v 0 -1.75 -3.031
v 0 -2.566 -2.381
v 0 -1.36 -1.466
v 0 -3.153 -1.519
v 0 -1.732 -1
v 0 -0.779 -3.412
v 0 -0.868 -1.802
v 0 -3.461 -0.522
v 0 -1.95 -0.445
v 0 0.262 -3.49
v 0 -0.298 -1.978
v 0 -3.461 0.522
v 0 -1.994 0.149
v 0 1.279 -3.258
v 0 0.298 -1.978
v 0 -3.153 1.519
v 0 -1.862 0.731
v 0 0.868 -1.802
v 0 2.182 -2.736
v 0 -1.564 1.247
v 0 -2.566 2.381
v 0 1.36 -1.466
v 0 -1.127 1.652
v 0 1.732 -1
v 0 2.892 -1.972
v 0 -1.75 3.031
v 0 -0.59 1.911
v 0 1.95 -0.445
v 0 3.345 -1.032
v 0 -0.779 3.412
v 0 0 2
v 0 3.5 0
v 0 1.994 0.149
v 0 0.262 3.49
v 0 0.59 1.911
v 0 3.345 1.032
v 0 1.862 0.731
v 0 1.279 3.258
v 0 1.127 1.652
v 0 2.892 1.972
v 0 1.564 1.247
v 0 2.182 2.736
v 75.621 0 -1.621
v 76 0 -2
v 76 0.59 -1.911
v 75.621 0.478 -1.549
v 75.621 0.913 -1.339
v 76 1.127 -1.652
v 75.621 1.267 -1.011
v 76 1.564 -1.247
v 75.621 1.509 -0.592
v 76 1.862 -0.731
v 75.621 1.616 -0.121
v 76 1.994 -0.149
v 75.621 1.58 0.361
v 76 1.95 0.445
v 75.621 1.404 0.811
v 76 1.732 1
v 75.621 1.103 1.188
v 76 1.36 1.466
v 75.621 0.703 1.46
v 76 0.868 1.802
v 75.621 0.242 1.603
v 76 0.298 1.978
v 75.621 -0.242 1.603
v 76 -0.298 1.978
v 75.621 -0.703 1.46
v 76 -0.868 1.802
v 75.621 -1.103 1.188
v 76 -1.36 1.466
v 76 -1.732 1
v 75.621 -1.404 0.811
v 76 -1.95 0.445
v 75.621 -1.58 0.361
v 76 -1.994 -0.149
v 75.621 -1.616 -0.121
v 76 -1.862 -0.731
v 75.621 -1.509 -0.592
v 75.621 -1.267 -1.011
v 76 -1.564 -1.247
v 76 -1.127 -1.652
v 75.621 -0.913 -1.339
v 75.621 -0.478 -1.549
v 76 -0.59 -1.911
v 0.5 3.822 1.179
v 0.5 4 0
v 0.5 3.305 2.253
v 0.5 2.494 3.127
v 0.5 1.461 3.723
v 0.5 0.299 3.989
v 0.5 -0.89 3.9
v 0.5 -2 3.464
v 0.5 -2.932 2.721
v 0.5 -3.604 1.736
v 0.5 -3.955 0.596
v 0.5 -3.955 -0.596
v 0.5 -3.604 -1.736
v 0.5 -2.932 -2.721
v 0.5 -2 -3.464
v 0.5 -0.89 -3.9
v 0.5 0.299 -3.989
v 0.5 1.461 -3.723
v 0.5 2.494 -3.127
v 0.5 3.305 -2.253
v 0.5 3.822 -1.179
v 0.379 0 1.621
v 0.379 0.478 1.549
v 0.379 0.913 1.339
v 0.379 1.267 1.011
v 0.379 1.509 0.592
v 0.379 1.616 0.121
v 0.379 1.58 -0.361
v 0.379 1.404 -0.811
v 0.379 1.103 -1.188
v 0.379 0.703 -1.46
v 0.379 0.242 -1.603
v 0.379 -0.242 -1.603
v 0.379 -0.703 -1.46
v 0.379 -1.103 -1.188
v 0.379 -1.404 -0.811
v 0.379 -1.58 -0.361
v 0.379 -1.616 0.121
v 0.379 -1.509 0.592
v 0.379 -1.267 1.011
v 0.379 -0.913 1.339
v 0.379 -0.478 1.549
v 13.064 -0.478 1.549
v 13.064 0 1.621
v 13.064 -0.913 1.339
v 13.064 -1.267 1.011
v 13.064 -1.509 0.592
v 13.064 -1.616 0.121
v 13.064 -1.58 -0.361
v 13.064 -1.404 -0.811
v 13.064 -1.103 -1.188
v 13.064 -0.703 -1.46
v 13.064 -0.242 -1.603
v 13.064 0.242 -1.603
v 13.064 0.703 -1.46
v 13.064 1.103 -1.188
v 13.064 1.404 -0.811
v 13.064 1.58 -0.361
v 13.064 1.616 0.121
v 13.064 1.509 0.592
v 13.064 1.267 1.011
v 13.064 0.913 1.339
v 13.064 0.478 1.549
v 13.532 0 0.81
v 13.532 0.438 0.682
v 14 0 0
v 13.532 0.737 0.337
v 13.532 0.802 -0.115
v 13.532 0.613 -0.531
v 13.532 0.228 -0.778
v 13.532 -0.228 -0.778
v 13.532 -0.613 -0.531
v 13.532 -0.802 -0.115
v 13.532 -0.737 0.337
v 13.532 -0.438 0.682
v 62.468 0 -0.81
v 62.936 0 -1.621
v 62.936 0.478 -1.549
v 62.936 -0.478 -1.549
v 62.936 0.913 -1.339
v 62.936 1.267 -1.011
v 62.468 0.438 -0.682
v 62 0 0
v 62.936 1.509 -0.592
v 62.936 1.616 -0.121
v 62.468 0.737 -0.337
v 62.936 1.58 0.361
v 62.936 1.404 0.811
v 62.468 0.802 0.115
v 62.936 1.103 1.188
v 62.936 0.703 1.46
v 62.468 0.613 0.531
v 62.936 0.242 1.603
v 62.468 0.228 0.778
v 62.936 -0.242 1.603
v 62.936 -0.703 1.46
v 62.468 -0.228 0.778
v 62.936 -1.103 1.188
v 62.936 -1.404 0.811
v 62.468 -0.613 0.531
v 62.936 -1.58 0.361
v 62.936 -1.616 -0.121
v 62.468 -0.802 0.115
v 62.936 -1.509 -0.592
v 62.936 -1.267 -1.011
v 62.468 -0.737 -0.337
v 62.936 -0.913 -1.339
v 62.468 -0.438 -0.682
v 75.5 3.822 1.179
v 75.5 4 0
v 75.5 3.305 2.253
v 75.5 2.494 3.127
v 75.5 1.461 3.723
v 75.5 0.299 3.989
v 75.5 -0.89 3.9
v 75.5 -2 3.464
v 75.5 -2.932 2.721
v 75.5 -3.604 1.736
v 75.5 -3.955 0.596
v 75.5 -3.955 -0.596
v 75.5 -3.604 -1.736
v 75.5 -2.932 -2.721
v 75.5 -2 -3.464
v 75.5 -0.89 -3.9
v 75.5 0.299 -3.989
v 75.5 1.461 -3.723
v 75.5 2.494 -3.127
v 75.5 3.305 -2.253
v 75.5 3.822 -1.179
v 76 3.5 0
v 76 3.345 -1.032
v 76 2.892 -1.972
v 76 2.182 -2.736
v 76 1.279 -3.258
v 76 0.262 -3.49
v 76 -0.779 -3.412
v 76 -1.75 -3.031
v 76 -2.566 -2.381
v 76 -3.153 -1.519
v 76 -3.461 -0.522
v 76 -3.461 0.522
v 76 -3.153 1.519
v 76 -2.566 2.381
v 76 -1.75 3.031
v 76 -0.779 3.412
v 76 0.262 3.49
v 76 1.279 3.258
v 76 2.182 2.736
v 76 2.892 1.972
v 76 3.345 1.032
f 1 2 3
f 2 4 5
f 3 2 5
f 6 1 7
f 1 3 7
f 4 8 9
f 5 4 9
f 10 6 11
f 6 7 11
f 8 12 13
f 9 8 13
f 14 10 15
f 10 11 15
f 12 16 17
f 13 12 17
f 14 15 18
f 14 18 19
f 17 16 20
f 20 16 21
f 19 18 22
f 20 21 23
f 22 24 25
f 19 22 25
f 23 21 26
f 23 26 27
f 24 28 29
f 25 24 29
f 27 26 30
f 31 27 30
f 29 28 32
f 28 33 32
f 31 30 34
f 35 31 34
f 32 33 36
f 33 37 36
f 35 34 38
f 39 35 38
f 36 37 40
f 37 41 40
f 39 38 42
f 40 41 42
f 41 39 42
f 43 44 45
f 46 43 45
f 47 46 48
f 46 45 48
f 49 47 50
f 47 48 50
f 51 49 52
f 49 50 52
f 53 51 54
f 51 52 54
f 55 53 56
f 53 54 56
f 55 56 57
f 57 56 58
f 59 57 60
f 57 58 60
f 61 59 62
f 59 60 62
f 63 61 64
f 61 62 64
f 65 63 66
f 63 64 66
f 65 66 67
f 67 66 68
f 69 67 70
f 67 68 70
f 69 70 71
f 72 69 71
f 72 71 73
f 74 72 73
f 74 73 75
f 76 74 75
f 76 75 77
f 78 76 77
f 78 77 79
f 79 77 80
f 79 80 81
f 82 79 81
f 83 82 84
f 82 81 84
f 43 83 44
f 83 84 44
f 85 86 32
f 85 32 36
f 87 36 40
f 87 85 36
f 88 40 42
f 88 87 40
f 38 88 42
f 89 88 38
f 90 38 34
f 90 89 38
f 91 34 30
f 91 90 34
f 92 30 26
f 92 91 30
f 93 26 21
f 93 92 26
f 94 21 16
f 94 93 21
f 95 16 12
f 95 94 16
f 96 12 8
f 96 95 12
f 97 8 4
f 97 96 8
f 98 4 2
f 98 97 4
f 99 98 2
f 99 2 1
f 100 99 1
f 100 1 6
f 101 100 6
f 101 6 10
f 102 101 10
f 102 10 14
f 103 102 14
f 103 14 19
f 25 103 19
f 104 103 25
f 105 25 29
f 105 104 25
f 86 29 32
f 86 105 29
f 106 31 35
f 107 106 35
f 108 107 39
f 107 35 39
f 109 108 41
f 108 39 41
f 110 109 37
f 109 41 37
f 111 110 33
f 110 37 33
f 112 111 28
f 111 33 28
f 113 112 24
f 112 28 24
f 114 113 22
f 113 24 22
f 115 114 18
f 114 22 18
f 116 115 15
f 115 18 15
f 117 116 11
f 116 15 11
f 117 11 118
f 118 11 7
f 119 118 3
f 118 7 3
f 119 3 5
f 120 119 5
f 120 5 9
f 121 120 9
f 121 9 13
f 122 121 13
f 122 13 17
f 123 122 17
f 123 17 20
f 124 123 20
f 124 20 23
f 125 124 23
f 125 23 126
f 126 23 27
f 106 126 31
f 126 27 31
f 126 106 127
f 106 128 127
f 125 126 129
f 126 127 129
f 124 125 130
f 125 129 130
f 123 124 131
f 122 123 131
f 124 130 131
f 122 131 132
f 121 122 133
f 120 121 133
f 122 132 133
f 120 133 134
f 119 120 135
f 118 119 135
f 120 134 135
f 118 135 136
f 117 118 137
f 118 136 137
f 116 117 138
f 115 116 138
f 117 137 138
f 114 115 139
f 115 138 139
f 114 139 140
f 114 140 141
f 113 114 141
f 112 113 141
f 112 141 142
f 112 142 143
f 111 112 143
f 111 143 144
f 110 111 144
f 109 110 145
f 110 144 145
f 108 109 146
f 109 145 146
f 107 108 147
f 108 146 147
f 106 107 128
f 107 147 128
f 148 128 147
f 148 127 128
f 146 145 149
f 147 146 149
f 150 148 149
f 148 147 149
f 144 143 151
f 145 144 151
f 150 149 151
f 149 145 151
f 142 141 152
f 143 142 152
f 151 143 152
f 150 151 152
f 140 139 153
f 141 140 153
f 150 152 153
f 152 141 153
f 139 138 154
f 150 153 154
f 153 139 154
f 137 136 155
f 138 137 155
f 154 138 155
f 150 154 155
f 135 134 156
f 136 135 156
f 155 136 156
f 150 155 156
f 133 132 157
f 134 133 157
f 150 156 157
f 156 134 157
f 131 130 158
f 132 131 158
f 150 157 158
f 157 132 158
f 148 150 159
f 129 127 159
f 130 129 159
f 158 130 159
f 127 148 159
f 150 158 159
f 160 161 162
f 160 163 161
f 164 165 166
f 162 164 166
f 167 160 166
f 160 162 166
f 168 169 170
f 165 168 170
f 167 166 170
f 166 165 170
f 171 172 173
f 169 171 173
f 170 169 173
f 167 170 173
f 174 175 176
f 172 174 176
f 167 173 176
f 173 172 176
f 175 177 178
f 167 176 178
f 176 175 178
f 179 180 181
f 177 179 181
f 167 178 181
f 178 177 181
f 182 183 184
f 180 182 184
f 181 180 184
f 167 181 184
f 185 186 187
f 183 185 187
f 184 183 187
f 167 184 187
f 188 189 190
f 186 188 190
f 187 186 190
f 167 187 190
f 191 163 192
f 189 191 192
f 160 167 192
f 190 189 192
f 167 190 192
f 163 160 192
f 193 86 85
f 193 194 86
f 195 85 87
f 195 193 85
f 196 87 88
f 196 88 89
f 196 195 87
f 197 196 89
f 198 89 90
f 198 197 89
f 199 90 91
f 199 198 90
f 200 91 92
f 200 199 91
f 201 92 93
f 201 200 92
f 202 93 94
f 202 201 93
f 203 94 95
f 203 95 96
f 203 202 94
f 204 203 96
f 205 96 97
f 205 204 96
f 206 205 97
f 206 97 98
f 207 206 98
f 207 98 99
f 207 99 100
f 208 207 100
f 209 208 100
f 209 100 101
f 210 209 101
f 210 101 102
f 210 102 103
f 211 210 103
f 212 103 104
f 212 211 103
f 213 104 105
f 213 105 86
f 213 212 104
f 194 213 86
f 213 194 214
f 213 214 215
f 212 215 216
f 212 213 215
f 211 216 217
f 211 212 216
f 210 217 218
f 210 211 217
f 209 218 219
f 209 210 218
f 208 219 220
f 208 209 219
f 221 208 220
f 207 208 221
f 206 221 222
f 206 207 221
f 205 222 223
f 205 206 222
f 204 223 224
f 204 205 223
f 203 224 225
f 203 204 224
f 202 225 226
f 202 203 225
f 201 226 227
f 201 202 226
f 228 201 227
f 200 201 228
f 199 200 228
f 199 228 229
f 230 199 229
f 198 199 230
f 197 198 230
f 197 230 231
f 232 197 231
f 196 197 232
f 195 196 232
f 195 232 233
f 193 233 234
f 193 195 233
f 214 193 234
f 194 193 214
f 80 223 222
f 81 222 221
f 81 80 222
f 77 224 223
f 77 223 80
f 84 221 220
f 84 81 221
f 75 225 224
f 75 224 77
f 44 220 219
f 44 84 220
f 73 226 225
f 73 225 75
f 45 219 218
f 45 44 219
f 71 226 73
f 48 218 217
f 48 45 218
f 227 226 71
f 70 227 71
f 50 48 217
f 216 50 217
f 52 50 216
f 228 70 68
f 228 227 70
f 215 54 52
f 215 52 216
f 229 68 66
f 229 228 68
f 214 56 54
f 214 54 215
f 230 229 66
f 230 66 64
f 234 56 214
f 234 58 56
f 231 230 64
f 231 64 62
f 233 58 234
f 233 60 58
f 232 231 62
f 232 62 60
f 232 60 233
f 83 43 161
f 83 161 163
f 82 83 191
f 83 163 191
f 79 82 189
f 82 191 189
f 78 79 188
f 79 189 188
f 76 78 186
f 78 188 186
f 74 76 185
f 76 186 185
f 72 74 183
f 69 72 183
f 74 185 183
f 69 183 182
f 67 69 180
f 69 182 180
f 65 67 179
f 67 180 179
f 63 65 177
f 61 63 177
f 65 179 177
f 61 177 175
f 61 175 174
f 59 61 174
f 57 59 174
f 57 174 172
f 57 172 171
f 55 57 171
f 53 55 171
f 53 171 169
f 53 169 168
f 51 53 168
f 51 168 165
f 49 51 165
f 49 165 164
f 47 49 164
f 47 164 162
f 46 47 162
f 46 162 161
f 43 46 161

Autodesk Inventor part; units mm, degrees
ref_plane "YZ Plane" through (0, 0, 0) normal (1, 0, 0) x (0, 1, 0)
ref_plane "XZ Plane" through (0, 0, 0) normal (0, 1, 0) x (-1, 0, 0)
ref_plane "XY Plane" through (0, 0, 0) normal (0, 0, 1) x (1, 0, 0)
sketch "Sketch_1" plane through (0, 0, 0) normal (0, 0, 1) x (1, 0, 0)
  line L0 (76, 0) -> (0, 0)
  line L1 (0, 0) -> (0, 3.5)
  line L2 (0, 3.5) -> (0.5, 4)
  line L3 (0.5, 4) -> (75.5, 4)
  line L4 (75.5, 4) -> (76, 3.5)
  line L5 (76, 3.5) -> (76, 0)
  line L6 (76, 0) -> (0, 0)
revolve "Revolution1" add sketch "Sketch_1" angle 360 about axis through (76, 0, 0) along (1, 0, 0)
sketch "Sketch2" plane through (0, 0, 0) normal (-1, 0, 0) x (0, 0, 1)
  point P0 (0, 0)
hole "Hole1" at (0, 0, 0) direction (1, 0, 0) diameter 3.242 depth 13.0641 tip angle 120 countersink diameter 4 countersink angle 90 thread size "M4x0.7" class "6H" standard "ISO Metric profile"
sketch "Sketch3" plane through (76, 0, 0) normal (1, 0, 0) x (0, 0, -1)
  point P0 (0, 0)
hole "Hole2" at (76, 0, 0) direction (-1, 0, 0) diameter 3.242 depth 13.0641 tip angle 120 countersink diameter 4 countersink angle 90 thread size "M4x0.7" class "6H" standard "ISO Metric profile"
properties part number "SFHRW8-76-M4-N4" material "鋼、炭素鋼"
